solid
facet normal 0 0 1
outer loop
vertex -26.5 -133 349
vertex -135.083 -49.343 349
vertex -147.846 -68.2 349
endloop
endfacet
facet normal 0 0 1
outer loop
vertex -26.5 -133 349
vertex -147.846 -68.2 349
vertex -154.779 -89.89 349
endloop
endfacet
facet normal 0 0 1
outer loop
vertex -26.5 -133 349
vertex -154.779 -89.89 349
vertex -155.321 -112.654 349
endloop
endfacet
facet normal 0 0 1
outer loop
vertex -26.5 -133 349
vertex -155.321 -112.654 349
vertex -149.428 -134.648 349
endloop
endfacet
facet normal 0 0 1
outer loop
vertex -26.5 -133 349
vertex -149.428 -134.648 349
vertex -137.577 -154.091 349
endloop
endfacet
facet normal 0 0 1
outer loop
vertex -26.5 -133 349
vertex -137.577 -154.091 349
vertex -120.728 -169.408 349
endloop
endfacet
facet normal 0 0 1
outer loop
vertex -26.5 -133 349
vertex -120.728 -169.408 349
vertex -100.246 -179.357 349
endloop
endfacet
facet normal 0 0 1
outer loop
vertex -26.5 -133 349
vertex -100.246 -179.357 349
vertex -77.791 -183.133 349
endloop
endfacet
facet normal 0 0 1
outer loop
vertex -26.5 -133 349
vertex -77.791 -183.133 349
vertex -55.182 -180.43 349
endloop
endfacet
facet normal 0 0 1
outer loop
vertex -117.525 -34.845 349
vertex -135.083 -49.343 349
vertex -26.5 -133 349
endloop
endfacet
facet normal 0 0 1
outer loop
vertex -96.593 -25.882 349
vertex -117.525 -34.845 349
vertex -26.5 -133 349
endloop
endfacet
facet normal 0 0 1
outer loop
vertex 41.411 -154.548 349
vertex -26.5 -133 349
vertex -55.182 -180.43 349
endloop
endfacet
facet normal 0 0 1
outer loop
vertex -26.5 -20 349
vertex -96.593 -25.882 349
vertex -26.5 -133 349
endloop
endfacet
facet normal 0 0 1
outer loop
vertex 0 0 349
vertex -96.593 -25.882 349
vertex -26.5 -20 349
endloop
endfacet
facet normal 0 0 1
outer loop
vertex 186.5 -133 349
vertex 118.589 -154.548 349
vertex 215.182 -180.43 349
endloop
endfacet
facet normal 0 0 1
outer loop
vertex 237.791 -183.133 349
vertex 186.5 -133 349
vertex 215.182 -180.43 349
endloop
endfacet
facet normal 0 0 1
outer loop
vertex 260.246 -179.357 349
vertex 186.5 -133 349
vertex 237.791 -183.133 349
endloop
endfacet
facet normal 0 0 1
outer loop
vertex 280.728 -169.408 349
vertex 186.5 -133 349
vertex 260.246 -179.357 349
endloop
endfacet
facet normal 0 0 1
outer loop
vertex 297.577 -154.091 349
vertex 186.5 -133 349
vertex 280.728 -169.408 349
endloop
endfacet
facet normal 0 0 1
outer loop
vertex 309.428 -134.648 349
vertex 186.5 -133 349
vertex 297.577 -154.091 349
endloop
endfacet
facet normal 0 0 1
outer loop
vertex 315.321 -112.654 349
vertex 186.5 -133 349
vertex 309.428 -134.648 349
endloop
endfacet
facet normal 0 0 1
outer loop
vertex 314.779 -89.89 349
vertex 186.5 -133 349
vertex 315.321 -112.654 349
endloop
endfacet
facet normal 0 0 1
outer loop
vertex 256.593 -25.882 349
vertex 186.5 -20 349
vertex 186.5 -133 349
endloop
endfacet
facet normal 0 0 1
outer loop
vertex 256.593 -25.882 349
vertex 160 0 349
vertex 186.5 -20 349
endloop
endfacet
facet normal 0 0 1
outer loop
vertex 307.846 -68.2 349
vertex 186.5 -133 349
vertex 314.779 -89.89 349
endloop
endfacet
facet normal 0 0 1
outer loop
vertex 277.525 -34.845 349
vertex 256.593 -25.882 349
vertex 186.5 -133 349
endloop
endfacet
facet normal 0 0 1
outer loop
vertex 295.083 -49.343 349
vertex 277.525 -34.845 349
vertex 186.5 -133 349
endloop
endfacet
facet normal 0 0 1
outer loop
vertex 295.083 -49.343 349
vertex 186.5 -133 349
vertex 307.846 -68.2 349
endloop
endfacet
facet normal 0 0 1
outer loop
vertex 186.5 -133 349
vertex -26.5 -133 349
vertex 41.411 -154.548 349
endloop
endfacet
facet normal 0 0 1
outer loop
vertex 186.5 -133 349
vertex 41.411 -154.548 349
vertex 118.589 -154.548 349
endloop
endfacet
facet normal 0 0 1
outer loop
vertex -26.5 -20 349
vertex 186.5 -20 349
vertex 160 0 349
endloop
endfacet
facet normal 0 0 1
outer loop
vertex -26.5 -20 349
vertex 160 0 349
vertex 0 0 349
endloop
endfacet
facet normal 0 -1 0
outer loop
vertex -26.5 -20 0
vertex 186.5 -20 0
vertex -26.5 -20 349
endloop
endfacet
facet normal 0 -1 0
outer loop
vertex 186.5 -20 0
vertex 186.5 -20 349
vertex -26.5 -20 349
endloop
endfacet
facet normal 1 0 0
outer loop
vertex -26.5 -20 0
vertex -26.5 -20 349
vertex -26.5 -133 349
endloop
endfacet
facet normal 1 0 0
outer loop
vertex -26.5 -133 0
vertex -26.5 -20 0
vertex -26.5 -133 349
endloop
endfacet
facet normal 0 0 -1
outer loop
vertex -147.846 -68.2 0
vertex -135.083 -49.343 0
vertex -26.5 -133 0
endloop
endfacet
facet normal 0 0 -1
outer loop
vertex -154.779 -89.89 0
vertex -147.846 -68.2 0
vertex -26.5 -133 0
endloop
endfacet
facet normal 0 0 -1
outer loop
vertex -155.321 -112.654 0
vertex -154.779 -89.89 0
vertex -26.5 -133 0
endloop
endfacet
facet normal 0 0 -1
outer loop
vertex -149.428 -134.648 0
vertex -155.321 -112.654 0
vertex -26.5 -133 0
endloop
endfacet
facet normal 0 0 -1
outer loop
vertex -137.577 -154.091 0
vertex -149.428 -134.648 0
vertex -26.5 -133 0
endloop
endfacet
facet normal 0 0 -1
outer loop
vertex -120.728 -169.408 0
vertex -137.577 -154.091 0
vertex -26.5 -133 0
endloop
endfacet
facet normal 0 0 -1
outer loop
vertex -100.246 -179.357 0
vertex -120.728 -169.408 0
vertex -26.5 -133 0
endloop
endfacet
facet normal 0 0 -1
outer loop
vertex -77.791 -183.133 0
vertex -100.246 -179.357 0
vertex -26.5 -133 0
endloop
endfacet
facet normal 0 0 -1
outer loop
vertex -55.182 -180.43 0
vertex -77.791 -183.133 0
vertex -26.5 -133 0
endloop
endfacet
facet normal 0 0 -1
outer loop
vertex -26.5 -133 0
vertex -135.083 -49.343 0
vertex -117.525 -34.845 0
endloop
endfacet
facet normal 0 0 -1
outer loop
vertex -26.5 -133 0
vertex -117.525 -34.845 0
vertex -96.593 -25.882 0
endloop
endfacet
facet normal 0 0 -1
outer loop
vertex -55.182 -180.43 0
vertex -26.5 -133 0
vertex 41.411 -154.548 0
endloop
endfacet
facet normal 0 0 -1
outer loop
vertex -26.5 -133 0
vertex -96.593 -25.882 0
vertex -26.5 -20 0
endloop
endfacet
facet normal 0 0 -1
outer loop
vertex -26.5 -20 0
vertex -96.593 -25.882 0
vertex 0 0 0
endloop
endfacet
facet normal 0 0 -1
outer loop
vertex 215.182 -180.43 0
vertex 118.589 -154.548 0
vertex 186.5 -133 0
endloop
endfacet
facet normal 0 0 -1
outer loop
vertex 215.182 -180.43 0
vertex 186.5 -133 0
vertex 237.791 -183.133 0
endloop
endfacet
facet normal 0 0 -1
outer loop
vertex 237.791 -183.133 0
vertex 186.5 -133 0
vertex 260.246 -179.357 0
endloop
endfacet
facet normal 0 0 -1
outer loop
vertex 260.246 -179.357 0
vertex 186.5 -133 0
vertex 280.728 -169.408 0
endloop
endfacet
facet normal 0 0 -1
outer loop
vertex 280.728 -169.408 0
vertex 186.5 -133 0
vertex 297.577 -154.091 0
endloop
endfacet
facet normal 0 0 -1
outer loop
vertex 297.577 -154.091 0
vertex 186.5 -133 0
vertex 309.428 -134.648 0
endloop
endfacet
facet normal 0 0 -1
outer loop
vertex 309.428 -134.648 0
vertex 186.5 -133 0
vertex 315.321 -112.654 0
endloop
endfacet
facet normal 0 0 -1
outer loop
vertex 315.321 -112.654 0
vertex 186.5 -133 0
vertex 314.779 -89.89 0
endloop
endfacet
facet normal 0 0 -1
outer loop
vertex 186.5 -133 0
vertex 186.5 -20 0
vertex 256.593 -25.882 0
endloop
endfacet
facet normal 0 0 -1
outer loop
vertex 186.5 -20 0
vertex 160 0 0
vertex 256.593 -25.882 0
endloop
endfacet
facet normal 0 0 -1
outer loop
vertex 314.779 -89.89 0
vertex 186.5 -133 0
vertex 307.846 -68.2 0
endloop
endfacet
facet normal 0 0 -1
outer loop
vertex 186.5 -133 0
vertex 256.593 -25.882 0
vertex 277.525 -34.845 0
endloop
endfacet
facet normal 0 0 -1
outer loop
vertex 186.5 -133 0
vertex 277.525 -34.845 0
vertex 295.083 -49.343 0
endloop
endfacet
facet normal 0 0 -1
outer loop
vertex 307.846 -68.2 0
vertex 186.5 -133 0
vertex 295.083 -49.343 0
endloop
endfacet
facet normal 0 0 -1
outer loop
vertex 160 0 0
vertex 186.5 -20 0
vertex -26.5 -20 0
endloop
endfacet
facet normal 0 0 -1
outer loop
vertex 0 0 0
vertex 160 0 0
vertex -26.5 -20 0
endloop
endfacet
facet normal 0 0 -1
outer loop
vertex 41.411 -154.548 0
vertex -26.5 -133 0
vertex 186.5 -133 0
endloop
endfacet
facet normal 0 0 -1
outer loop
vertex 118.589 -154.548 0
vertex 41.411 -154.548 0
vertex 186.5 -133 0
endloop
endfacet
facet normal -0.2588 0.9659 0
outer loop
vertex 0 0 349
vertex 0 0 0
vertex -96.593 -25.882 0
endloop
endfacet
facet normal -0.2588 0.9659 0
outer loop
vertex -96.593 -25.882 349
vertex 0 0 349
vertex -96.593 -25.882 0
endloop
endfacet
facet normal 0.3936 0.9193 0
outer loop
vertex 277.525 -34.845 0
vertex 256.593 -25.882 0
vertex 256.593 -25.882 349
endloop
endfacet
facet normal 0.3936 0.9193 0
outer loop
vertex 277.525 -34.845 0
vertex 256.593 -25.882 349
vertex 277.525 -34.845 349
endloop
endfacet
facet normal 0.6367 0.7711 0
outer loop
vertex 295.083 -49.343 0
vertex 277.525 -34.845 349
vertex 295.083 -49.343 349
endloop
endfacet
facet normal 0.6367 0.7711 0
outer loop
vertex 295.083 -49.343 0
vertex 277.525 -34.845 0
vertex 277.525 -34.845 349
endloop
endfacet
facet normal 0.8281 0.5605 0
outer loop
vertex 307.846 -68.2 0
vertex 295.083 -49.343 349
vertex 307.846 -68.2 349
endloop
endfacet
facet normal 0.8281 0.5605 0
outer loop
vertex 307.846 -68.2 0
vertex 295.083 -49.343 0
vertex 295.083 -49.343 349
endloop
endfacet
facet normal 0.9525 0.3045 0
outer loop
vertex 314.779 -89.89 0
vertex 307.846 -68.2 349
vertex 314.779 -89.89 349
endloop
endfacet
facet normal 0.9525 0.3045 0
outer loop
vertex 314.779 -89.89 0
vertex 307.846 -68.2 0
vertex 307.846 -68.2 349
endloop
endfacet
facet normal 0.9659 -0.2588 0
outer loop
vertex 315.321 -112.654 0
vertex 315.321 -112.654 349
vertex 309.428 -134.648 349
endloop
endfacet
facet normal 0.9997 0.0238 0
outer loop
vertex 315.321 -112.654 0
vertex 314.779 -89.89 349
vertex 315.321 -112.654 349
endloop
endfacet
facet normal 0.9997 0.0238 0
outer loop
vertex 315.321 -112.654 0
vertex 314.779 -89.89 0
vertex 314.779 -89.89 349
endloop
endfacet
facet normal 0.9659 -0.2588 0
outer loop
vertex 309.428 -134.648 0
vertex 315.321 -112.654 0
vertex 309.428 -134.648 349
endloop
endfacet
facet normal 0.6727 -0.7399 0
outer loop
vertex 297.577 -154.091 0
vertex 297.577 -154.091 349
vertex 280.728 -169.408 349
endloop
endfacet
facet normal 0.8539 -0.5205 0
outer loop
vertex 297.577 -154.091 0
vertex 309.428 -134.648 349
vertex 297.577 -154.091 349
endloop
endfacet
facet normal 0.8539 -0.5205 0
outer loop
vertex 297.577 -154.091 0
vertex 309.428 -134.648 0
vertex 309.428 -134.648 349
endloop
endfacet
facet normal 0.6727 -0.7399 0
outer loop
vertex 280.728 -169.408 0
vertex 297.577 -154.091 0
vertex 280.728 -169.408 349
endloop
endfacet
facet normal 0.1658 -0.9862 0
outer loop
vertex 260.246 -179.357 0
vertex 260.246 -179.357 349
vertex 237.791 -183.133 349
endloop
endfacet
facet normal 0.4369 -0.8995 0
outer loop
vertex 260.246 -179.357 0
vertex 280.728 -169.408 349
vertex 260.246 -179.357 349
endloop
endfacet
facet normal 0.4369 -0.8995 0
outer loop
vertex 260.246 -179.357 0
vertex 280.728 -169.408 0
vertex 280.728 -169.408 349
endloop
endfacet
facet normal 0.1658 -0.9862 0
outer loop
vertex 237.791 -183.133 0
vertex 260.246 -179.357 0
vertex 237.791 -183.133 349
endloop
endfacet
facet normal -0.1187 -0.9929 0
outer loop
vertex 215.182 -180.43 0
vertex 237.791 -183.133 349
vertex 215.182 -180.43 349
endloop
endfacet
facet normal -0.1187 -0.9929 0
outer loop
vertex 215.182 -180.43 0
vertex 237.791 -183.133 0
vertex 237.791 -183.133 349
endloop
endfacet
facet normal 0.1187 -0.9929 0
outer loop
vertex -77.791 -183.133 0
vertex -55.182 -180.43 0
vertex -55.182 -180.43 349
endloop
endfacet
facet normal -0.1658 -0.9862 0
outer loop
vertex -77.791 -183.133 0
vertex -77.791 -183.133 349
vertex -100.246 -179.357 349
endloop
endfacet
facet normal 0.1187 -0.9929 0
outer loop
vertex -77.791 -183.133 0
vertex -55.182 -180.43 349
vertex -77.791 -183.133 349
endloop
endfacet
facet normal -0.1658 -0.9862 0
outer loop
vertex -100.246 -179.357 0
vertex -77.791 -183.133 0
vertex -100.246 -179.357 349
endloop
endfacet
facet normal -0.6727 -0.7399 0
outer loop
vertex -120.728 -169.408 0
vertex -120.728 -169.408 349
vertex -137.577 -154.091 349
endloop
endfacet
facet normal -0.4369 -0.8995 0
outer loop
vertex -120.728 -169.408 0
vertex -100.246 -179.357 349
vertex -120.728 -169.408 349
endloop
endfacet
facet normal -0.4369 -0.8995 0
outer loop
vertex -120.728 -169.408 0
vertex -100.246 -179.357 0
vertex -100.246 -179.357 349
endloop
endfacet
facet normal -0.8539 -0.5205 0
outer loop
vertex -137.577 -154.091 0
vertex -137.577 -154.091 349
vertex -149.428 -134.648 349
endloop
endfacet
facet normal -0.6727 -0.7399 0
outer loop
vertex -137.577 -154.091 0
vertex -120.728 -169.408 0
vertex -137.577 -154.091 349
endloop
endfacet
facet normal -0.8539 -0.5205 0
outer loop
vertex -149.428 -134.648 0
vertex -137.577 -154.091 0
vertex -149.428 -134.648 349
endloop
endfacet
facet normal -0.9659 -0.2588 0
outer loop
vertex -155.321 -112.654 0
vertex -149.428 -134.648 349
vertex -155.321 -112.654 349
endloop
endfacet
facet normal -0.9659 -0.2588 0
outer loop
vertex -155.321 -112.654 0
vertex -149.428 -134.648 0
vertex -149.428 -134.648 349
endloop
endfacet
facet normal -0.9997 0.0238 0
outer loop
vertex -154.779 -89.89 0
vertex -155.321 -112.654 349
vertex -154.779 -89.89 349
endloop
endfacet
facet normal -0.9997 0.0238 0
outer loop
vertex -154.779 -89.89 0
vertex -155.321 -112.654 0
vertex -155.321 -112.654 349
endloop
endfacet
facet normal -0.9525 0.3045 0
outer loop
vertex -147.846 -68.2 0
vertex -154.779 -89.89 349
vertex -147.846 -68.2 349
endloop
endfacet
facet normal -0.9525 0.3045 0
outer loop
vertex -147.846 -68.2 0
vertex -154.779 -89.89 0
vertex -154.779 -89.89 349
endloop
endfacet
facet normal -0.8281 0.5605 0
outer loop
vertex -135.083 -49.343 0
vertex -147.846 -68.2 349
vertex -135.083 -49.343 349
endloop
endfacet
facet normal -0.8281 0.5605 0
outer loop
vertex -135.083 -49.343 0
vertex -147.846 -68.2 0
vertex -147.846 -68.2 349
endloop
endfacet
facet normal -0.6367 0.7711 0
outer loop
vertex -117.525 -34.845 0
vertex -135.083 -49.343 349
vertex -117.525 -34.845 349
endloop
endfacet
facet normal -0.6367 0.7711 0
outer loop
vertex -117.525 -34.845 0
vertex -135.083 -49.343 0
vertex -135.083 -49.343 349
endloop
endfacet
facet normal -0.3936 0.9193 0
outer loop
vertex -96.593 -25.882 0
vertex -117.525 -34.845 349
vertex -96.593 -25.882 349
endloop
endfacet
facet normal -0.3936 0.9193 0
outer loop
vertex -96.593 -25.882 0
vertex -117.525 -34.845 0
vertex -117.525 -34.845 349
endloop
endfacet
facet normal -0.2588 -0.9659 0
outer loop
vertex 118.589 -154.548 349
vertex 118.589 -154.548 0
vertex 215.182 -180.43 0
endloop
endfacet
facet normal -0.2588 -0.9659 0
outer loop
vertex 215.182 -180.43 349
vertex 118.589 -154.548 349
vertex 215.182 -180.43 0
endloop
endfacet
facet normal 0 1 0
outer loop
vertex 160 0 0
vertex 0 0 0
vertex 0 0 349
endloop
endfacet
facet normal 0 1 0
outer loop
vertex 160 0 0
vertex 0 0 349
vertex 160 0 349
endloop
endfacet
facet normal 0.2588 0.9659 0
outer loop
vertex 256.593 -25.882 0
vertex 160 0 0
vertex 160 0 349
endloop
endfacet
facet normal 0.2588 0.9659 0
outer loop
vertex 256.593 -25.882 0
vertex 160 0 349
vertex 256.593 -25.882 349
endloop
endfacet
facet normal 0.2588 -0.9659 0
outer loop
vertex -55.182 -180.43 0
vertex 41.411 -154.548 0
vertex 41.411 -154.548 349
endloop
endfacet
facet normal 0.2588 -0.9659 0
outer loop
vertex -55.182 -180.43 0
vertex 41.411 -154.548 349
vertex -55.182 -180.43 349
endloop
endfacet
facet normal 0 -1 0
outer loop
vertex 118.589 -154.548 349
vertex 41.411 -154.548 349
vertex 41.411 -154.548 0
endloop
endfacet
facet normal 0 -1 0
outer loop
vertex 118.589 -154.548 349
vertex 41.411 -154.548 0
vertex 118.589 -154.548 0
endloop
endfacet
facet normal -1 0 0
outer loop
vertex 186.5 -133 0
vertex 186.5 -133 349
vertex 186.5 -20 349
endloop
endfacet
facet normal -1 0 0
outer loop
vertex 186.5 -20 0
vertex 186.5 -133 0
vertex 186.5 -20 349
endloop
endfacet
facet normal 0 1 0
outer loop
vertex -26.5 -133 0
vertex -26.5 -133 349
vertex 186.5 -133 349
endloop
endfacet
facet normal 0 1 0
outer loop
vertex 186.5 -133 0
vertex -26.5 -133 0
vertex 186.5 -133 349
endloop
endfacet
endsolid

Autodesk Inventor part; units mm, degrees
ref_plane "YZ Plane" through (0, 0, 0) normal (1, 0, 0) x (0, 1, 0)
ref_plane "XZ Plane" through (0, 0, 0) normal (0, 1, 0) x (-1, 0, 0)
ref_plane "XY Plane" through (0, 0, 0) normal (0, 0, 1) x (1, 0, 0)
sketch "Sketch1" plane through (0, 0, 0) normal (0, 0, 1) x (1, 0, 0)
  line L0 (0, 0) -> (160, 0)
  line L1 (160, 0) -> (118.589, -154.5481) construction
  line L2 (0, 0) -> (41.411, -154.5481) construction
  line L3 (41.411, -154.5481) -> (118.589, -154.5481)
  circle A0 centre (235.8871, -103.156) radius 80 construction
  line L4 (160, 0) -> (256.5926, -25.8819)
  line L5 (118.589, -154.5481) -> (215.1815, -180.43)
  arc A1 (215.1815, -180.43) -> (256.5926, -25.8819) centre (235.8871, -103.156) ccw
  circle A2 centre (-75.8871, -103.156) radius 80 construction
  line L6 (0, 0) -> (-96.5926, -25.8819)
  line L7 (41.411, -154.5481) -> (-55.1815, -180.43)
  arc A3 (-96.5926, -25.8819) -> (-55.1815, -180.43) centre (-75.8871, -103.156) ccw
  dimension "d0" = 160
  dimension "d1" = 160
  dimension "d2" = 160
  dimension "d3" = 75
  dimension "d4" = 75
  dimension "d5" = 160
  dimension "d6" = 100
  dimension "d7" = 160
  dimension "d9" = 100
extrude "Extrusion1" add sketch "Sketch1" along normal blind 349
sketch "Sketch2" plane through (0, 0, 349) normal (0, 0, 1) x (1, 0, 0)
  line L0 (-26.5, -133) -> (186.5, -133)
  line L1 (186.5, -133) -> (186.5, -20)
  line L2 (186.5, -20) -> (-26.5, -20)
  line L3 (-26.5, -20) -> (-26.5, -133)
  line L4 (160, 0) -> (0, 0) projected
  point P0 (80, -20)
  point P1 (80, 0)
  dimension "d12" = 213
  dimension "d13" = 113
  dimension "d14" = 20
extrude "Extrusion2" cut sketch "Sketch2" against normal through all
properties part number "Riser Base" material "ABS Plastic"
